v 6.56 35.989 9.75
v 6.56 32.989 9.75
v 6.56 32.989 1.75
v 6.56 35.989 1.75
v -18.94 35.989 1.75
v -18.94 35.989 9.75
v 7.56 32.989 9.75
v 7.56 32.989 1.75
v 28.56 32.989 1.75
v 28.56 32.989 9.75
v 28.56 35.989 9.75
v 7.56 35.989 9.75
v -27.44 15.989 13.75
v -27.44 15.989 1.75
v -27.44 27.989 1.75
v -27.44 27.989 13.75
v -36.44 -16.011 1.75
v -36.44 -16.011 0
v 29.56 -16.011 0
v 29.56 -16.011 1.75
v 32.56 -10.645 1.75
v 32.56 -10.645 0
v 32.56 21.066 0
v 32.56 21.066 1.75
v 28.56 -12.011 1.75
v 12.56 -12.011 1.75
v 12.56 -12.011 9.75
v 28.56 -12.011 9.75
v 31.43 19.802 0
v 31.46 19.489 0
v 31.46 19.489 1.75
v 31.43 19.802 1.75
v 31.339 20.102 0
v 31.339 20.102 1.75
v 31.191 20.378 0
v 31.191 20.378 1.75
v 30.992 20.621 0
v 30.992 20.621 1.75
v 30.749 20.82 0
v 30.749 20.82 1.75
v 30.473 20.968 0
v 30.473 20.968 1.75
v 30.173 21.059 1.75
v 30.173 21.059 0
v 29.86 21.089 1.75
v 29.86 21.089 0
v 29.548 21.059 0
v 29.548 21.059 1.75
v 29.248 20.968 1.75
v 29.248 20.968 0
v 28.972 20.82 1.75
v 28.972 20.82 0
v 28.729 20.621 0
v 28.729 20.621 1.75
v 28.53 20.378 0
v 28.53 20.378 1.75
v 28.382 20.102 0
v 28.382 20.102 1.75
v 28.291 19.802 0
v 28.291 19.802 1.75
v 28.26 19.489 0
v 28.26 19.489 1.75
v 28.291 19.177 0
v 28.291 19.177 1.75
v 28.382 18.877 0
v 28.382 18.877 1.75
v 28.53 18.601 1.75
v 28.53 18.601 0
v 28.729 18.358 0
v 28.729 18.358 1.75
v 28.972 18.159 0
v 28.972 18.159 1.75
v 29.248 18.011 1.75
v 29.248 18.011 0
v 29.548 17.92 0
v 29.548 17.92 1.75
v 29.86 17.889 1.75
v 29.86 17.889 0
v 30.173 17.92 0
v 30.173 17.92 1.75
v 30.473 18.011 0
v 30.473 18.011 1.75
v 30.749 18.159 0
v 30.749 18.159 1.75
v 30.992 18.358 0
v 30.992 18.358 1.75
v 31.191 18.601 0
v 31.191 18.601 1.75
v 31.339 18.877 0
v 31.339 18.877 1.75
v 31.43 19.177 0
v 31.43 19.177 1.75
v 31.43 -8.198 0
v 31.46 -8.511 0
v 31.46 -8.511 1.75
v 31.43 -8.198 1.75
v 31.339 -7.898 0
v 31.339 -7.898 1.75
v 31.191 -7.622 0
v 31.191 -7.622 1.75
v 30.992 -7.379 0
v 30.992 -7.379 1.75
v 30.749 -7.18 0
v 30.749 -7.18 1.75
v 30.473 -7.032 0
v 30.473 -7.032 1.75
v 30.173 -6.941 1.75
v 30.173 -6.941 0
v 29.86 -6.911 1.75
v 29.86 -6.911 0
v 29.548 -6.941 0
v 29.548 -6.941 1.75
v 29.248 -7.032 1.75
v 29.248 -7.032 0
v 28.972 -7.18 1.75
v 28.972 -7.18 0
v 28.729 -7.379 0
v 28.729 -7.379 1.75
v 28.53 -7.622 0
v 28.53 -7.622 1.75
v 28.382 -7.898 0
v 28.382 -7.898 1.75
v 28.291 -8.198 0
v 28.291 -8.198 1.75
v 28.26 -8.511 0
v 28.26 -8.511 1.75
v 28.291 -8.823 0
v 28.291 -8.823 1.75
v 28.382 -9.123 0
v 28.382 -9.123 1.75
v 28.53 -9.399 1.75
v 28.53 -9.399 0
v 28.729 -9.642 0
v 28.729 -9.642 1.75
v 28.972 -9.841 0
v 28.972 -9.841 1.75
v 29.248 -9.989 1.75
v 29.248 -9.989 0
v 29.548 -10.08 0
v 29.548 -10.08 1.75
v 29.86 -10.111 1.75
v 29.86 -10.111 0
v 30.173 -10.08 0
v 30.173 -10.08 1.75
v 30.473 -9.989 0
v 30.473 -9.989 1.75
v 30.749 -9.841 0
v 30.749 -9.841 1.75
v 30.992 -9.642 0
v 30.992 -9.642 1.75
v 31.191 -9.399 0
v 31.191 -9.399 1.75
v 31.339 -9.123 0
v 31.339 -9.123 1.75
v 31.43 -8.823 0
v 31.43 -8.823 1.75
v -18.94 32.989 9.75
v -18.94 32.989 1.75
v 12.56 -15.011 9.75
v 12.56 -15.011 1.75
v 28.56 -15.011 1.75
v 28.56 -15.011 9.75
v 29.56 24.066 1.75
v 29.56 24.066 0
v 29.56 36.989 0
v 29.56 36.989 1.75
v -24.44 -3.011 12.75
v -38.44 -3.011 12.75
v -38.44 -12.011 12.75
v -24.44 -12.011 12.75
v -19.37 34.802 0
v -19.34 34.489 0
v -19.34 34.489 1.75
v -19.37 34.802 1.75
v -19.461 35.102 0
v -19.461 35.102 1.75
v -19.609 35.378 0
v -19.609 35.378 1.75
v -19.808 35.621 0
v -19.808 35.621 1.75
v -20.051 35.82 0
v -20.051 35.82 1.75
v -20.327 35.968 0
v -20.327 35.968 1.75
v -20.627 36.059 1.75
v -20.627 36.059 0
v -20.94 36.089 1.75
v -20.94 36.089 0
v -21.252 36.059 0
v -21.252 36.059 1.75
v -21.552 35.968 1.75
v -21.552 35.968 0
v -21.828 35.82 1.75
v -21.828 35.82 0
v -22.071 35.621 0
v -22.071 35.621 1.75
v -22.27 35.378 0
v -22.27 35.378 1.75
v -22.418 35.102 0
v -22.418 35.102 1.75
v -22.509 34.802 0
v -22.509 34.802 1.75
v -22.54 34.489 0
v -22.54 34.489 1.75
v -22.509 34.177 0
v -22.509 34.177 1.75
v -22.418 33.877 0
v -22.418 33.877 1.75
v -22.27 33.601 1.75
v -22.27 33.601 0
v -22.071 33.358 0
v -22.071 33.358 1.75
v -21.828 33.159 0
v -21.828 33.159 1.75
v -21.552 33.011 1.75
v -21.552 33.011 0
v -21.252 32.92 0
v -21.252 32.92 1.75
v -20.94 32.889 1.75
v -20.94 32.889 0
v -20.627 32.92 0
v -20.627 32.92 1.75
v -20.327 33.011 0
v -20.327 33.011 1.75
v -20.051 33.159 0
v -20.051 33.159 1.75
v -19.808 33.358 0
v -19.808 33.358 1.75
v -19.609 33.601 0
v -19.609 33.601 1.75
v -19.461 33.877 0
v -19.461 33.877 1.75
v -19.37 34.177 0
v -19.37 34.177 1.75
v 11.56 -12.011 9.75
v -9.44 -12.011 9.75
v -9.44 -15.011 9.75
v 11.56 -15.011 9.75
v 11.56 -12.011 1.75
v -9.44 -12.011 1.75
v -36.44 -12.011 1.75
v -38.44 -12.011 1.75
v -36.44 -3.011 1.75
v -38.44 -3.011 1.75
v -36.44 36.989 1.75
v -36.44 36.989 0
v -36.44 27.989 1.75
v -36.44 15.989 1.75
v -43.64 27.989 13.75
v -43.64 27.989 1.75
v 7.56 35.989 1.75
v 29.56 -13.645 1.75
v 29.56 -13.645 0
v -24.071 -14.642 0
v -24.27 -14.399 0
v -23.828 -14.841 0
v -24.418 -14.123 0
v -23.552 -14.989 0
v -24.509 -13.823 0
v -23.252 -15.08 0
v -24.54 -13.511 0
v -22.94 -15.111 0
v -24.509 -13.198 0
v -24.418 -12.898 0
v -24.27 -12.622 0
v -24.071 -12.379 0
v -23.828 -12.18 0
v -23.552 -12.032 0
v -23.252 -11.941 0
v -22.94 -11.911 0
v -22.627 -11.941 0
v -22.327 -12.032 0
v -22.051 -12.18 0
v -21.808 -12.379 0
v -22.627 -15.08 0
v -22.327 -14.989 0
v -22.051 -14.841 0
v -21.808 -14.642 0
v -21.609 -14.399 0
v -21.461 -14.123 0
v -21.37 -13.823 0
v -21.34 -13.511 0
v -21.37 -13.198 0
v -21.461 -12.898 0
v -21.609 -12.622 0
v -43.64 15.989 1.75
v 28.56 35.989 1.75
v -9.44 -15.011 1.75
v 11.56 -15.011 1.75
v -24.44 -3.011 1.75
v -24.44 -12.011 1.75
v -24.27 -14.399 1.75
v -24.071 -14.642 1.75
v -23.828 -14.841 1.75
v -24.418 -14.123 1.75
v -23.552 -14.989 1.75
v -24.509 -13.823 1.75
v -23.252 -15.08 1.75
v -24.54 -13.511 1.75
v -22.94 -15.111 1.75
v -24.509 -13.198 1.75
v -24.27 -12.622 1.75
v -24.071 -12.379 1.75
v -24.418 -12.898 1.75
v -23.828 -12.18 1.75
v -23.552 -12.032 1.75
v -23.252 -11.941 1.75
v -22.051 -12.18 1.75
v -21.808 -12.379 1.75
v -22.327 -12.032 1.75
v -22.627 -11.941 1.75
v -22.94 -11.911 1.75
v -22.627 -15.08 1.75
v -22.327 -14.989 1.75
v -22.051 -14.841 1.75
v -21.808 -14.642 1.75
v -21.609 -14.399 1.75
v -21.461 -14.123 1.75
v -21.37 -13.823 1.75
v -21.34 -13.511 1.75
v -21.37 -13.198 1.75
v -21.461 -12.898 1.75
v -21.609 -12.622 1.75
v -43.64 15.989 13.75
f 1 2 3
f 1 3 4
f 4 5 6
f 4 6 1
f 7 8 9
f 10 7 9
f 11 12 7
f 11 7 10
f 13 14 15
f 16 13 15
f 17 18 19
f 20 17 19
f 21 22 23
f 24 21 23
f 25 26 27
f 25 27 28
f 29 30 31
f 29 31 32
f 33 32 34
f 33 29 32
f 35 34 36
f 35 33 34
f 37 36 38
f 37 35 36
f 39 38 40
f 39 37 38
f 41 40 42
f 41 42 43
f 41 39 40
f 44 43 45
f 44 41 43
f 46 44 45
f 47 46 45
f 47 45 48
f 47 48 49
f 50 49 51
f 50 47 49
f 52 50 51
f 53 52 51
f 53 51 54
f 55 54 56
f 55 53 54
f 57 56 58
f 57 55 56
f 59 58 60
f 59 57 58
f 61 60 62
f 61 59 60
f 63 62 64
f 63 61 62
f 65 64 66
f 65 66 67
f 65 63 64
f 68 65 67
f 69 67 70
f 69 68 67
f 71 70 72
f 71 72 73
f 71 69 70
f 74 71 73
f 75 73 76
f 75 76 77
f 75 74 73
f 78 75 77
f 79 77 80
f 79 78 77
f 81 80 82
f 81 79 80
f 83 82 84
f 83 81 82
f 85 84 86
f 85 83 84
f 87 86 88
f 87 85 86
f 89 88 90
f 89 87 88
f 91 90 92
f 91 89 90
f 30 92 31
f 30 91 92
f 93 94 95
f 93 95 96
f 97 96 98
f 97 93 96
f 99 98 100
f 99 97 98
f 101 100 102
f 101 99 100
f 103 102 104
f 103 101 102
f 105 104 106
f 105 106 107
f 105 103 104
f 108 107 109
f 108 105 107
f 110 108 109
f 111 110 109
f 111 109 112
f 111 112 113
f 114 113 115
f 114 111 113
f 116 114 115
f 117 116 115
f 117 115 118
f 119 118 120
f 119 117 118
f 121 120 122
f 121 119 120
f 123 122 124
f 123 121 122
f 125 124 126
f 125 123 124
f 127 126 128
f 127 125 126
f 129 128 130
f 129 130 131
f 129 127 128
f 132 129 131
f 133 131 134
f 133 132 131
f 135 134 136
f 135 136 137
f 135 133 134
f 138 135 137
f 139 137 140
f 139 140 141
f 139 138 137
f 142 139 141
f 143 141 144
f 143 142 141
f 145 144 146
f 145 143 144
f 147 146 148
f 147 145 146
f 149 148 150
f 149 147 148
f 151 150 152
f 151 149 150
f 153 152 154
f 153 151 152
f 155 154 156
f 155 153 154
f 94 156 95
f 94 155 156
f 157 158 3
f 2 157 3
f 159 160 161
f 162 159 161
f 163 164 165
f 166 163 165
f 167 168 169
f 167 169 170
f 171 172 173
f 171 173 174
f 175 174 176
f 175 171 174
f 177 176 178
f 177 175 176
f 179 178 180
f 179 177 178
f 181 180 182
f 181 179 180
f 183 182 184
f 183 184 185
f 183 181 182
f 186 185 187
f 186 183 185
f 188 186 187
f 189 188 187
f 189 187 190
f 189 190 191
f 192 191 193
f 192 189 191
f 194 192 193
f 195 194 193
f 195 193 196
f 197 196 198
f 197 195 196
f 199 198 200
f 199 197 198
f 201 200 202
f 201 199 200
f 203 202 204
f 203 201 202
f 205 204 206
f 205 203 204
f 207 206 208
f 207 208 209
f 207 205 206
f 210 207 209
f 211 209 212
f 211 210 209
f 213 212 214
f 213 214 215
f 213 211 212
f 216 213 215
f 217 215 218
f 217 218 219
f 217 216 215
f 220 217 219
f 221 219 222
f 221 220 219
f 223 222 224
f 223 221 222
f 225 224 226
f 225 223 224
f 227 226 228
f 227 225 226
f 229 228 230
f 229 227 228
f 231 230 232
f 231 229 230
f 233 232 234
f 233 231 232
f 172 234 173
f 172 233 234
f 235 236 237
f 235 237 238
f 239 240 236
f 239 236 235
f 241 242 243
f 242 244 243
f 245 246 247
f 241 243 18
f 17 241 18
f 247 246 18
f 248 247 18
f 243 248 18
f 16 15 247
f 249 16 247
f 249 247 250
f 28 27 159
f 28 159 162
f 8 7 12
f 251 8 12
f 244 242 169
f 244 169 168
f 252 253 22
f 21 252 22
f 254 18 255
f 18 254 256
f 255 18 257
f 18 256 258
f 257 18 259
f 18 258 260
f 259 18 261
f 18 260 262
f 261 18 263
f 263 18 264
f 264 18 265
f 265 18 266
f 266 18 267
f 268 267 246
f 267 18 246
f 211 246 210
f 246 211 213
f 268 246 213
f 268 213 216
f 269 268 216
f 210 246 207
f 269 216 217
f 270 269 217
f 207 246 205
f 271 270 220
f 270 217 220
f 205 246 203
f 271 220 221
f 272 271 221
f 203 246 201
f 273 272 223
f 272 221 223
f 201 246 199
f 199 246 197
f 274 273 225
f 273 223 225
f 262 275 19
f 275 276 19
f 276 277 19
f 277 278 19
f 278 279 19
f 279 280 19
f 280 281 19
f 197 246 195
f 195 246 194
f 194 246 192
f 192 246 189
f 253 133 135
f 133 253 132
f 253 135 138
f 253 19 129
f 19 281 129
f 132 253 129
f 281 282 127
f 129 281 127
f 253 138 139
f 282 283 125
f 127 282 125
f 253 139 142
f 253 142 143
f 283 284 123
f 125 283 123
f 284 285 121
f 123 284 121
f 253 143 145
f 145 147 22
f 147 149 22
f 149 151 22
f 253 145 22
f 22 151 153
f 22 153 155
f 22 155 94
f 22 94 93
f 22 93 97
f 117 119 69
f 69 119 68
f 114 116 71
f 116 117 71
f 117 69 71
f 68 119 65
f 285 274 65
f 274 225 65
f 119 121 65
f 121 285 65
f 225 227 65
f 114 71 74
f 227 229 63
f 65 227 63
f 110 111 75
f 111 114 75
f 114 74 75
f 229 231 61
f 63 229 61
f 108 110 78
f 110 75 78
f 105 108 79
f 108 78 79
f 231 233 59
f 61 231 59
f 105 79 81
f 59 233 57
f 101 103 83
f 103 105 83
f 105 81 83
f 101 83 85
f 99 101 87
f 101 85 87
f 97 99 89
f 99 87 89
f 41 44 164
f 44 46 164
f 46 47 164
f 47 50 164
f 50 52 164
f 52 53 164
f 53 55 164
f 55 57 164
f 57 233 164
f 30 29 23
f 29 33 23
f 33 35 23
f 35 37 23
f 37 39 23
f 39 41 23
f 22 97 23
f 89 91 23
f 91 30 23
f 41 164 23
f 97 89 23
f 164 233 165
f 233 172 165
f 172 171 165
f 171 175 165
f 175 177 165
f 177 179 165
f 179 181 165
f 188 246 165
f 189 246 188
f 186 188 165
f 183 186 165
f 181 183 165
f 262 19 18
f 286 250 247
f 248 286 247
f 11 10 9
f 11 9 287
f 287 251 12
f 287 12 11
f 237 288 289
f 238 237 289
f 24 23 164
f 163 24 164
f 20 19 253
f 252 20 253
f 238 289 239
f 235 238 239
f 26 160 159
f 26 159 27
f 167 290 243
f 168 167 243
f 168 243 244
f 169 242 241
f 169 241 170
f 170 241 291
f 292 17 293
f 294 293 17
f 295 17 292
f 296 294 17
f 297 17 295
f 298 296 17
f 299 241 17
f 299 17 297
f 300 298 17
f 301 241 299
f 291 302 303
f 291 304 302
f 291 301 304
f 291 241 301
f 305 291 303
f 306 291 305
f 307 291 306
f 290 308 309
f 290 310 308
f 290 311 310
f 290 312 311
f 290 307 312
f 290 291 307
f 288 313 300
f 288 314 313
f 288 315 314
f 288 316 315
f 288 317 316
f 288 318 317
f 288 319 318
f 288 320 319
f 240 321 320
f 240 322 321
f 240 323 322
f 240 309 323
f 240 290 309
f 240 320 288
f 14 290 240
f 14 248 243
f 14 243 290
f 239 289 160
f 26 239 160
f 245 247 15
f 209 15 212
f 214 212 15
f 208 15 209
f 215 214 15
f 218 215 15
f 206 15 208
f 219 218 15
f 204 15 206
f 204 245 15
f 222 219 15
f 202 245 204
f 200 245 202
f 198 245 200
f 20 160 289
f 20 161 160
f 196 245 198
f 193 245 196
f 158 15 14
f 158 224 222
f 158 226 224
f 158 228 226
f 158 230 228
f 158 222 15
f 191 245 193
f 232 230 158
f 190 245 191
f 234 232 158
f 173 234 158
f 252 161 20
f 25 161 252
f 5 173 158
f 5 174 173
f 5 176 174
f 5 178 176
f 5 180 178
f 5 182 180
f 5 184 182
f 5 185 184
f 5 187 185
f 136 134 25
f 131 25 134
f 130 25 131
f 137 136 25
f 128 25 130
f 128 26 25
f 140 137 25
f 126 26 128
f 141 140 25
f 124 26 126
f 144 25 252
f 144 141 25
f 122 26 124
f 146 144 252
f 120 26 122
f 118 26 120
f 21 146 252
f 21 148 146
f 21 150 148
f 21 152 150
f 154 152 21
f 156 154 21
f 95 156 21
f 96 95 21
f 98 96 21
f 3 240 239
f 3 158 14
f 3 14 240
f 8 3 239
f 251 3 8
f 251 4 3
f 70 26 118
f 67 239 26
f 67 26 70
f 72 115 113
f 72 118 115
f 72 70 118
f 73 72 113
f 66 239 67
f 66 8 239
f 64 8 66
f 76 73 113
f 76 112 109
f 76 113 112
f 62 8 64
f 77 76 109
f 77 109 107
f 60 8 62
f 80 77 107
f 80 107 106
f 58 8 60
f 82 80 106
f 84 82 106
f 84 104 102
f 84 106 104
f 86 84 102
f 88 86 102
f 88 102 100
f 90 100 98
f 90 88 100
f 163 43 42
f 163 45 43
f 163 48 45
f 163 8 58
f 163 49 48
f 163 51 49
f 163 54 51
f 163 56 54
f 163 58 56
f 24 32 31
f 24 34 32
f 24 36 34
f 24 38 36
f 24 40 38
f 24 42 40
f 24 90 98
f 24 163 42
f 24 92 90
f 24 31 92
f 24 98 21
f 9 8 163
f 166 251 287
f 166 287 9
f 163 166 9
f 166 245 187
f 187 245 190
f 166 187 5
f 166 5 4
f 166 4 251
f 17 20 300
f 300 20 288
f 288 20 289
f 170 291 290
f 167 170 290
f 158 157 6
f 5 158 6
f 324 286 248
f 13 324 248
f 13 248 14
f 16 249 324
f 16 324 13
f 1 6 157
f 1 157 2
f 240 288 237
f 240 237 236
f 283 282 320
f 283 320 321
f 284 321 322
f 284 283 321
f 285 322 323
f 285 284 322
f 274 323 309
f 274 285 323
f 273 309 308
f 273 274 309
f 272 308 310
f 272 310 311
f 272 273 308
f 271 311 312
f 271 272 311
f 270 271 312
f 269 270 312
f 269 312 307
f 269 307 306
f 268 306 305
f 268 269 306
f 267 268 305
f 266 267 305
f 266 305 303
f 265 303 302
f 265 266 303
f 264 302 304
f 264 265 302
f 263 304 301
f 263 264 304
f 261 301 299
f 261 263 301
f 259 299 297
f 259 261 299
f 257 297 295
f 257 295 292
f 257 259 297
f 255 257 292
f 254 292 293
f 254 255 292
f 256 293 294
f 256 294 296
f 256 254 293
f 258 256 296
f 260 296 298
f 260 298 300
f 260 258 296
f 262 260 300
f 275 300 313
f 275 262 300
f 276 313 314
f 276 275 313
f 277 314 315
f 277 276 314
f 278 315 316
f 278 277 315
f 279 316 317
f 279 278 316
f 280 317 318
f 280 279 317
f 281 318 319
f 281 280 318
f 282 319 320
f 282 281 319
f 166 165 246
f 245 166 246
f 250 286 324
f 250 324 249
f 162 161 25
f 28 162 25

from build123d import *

# Parameters (mm, degrees)
F0_R     = 1.6
F1_DEPTH = 1.75
F2_W     = 7.2
F2_H     = 12
F2_W_2   = 9
F3_DEPTH = 12
F4_W     = 12
F4_H     = 9
F4_W_2   = 2
F5_DEPTH = 11
F6_W     = 21
F6_H     = 3
F6_W_2   = 16
F6_W_3   = 25.5
F7_DEPTH = 8


with BuildPart() as f1:
    # F0 (on Top) → F1 (new body)
    with BuildSketch(Plane.XY):
        Polygon((29.560432, 36.989467), (-36.439568, 36.989467), (-36.439568, -16.010533), (29.560432, -16.010533), (29.560432, -13.644766), (32.560432, -10.644766), (32.560432, 21.065632), (29.560432, 24.065632), align=None)
        with Locations((-22.939568, -13.510533)):
            Circle(F0_R, mode=Mode.SUBTRACT)
        with Locations((29.860432, -8.510533)):
            Circle(F0_R, mode=Mode.SUBTRACT)
        with Locations((-20.939568, 34.489467)):
            Circle(F0_R, mode=Mode.SUBTRACT)
        with Locations((29.860432, 19.489467)):
            Circle(F0_R, mode=Mode.SUBTRACT)
    extrude(amount=F1_DEPTH)

    # F2 (on face) → F3 (join)
    with BuildSketch(Plane.XY.offset(1.75)):
        with Locations((-40.039568, 21.989467)):
            Rectangle(F2_W, F2_H)
        with Locations((-31.939568, 21.989467)):
            Rectangle(F2_W_2, F2_H)
    extrude(amount=F3_DEPTH)

    # F4 (on face) → F5 (join)
    with BuildSketch(Plane.XY.offset(1.75)):
        with Locations((-30.439568, -7.510533)):
            Rectangle(F4_W, F4_H)
        with Locations((-37.439568, -7.510533)):
            Rectangle(F4_W_2, F4_H)
    extrude(amount=F5_DEPTH)

    # F6 (on face) → F7 (join)
    with BuildSketch(Plane.XY.offset(1.75)):
        with Locations((1.060432, -13.510533)):
            Rectangle(F6_W, F6_H)
        with Locations((20.560432, -13.510533)):
            Rectangle(F6_W_2, F6_H)
        with Locations((18.060432, 34.489467)):
            Rectangle(F6_W, F6_H)
        with Locations((-6.189568, 34.489467)):
            Rectangle(F6_W_3, F6_H)
    extrude(amount=F7_DEPTH)


solid = f1.part
